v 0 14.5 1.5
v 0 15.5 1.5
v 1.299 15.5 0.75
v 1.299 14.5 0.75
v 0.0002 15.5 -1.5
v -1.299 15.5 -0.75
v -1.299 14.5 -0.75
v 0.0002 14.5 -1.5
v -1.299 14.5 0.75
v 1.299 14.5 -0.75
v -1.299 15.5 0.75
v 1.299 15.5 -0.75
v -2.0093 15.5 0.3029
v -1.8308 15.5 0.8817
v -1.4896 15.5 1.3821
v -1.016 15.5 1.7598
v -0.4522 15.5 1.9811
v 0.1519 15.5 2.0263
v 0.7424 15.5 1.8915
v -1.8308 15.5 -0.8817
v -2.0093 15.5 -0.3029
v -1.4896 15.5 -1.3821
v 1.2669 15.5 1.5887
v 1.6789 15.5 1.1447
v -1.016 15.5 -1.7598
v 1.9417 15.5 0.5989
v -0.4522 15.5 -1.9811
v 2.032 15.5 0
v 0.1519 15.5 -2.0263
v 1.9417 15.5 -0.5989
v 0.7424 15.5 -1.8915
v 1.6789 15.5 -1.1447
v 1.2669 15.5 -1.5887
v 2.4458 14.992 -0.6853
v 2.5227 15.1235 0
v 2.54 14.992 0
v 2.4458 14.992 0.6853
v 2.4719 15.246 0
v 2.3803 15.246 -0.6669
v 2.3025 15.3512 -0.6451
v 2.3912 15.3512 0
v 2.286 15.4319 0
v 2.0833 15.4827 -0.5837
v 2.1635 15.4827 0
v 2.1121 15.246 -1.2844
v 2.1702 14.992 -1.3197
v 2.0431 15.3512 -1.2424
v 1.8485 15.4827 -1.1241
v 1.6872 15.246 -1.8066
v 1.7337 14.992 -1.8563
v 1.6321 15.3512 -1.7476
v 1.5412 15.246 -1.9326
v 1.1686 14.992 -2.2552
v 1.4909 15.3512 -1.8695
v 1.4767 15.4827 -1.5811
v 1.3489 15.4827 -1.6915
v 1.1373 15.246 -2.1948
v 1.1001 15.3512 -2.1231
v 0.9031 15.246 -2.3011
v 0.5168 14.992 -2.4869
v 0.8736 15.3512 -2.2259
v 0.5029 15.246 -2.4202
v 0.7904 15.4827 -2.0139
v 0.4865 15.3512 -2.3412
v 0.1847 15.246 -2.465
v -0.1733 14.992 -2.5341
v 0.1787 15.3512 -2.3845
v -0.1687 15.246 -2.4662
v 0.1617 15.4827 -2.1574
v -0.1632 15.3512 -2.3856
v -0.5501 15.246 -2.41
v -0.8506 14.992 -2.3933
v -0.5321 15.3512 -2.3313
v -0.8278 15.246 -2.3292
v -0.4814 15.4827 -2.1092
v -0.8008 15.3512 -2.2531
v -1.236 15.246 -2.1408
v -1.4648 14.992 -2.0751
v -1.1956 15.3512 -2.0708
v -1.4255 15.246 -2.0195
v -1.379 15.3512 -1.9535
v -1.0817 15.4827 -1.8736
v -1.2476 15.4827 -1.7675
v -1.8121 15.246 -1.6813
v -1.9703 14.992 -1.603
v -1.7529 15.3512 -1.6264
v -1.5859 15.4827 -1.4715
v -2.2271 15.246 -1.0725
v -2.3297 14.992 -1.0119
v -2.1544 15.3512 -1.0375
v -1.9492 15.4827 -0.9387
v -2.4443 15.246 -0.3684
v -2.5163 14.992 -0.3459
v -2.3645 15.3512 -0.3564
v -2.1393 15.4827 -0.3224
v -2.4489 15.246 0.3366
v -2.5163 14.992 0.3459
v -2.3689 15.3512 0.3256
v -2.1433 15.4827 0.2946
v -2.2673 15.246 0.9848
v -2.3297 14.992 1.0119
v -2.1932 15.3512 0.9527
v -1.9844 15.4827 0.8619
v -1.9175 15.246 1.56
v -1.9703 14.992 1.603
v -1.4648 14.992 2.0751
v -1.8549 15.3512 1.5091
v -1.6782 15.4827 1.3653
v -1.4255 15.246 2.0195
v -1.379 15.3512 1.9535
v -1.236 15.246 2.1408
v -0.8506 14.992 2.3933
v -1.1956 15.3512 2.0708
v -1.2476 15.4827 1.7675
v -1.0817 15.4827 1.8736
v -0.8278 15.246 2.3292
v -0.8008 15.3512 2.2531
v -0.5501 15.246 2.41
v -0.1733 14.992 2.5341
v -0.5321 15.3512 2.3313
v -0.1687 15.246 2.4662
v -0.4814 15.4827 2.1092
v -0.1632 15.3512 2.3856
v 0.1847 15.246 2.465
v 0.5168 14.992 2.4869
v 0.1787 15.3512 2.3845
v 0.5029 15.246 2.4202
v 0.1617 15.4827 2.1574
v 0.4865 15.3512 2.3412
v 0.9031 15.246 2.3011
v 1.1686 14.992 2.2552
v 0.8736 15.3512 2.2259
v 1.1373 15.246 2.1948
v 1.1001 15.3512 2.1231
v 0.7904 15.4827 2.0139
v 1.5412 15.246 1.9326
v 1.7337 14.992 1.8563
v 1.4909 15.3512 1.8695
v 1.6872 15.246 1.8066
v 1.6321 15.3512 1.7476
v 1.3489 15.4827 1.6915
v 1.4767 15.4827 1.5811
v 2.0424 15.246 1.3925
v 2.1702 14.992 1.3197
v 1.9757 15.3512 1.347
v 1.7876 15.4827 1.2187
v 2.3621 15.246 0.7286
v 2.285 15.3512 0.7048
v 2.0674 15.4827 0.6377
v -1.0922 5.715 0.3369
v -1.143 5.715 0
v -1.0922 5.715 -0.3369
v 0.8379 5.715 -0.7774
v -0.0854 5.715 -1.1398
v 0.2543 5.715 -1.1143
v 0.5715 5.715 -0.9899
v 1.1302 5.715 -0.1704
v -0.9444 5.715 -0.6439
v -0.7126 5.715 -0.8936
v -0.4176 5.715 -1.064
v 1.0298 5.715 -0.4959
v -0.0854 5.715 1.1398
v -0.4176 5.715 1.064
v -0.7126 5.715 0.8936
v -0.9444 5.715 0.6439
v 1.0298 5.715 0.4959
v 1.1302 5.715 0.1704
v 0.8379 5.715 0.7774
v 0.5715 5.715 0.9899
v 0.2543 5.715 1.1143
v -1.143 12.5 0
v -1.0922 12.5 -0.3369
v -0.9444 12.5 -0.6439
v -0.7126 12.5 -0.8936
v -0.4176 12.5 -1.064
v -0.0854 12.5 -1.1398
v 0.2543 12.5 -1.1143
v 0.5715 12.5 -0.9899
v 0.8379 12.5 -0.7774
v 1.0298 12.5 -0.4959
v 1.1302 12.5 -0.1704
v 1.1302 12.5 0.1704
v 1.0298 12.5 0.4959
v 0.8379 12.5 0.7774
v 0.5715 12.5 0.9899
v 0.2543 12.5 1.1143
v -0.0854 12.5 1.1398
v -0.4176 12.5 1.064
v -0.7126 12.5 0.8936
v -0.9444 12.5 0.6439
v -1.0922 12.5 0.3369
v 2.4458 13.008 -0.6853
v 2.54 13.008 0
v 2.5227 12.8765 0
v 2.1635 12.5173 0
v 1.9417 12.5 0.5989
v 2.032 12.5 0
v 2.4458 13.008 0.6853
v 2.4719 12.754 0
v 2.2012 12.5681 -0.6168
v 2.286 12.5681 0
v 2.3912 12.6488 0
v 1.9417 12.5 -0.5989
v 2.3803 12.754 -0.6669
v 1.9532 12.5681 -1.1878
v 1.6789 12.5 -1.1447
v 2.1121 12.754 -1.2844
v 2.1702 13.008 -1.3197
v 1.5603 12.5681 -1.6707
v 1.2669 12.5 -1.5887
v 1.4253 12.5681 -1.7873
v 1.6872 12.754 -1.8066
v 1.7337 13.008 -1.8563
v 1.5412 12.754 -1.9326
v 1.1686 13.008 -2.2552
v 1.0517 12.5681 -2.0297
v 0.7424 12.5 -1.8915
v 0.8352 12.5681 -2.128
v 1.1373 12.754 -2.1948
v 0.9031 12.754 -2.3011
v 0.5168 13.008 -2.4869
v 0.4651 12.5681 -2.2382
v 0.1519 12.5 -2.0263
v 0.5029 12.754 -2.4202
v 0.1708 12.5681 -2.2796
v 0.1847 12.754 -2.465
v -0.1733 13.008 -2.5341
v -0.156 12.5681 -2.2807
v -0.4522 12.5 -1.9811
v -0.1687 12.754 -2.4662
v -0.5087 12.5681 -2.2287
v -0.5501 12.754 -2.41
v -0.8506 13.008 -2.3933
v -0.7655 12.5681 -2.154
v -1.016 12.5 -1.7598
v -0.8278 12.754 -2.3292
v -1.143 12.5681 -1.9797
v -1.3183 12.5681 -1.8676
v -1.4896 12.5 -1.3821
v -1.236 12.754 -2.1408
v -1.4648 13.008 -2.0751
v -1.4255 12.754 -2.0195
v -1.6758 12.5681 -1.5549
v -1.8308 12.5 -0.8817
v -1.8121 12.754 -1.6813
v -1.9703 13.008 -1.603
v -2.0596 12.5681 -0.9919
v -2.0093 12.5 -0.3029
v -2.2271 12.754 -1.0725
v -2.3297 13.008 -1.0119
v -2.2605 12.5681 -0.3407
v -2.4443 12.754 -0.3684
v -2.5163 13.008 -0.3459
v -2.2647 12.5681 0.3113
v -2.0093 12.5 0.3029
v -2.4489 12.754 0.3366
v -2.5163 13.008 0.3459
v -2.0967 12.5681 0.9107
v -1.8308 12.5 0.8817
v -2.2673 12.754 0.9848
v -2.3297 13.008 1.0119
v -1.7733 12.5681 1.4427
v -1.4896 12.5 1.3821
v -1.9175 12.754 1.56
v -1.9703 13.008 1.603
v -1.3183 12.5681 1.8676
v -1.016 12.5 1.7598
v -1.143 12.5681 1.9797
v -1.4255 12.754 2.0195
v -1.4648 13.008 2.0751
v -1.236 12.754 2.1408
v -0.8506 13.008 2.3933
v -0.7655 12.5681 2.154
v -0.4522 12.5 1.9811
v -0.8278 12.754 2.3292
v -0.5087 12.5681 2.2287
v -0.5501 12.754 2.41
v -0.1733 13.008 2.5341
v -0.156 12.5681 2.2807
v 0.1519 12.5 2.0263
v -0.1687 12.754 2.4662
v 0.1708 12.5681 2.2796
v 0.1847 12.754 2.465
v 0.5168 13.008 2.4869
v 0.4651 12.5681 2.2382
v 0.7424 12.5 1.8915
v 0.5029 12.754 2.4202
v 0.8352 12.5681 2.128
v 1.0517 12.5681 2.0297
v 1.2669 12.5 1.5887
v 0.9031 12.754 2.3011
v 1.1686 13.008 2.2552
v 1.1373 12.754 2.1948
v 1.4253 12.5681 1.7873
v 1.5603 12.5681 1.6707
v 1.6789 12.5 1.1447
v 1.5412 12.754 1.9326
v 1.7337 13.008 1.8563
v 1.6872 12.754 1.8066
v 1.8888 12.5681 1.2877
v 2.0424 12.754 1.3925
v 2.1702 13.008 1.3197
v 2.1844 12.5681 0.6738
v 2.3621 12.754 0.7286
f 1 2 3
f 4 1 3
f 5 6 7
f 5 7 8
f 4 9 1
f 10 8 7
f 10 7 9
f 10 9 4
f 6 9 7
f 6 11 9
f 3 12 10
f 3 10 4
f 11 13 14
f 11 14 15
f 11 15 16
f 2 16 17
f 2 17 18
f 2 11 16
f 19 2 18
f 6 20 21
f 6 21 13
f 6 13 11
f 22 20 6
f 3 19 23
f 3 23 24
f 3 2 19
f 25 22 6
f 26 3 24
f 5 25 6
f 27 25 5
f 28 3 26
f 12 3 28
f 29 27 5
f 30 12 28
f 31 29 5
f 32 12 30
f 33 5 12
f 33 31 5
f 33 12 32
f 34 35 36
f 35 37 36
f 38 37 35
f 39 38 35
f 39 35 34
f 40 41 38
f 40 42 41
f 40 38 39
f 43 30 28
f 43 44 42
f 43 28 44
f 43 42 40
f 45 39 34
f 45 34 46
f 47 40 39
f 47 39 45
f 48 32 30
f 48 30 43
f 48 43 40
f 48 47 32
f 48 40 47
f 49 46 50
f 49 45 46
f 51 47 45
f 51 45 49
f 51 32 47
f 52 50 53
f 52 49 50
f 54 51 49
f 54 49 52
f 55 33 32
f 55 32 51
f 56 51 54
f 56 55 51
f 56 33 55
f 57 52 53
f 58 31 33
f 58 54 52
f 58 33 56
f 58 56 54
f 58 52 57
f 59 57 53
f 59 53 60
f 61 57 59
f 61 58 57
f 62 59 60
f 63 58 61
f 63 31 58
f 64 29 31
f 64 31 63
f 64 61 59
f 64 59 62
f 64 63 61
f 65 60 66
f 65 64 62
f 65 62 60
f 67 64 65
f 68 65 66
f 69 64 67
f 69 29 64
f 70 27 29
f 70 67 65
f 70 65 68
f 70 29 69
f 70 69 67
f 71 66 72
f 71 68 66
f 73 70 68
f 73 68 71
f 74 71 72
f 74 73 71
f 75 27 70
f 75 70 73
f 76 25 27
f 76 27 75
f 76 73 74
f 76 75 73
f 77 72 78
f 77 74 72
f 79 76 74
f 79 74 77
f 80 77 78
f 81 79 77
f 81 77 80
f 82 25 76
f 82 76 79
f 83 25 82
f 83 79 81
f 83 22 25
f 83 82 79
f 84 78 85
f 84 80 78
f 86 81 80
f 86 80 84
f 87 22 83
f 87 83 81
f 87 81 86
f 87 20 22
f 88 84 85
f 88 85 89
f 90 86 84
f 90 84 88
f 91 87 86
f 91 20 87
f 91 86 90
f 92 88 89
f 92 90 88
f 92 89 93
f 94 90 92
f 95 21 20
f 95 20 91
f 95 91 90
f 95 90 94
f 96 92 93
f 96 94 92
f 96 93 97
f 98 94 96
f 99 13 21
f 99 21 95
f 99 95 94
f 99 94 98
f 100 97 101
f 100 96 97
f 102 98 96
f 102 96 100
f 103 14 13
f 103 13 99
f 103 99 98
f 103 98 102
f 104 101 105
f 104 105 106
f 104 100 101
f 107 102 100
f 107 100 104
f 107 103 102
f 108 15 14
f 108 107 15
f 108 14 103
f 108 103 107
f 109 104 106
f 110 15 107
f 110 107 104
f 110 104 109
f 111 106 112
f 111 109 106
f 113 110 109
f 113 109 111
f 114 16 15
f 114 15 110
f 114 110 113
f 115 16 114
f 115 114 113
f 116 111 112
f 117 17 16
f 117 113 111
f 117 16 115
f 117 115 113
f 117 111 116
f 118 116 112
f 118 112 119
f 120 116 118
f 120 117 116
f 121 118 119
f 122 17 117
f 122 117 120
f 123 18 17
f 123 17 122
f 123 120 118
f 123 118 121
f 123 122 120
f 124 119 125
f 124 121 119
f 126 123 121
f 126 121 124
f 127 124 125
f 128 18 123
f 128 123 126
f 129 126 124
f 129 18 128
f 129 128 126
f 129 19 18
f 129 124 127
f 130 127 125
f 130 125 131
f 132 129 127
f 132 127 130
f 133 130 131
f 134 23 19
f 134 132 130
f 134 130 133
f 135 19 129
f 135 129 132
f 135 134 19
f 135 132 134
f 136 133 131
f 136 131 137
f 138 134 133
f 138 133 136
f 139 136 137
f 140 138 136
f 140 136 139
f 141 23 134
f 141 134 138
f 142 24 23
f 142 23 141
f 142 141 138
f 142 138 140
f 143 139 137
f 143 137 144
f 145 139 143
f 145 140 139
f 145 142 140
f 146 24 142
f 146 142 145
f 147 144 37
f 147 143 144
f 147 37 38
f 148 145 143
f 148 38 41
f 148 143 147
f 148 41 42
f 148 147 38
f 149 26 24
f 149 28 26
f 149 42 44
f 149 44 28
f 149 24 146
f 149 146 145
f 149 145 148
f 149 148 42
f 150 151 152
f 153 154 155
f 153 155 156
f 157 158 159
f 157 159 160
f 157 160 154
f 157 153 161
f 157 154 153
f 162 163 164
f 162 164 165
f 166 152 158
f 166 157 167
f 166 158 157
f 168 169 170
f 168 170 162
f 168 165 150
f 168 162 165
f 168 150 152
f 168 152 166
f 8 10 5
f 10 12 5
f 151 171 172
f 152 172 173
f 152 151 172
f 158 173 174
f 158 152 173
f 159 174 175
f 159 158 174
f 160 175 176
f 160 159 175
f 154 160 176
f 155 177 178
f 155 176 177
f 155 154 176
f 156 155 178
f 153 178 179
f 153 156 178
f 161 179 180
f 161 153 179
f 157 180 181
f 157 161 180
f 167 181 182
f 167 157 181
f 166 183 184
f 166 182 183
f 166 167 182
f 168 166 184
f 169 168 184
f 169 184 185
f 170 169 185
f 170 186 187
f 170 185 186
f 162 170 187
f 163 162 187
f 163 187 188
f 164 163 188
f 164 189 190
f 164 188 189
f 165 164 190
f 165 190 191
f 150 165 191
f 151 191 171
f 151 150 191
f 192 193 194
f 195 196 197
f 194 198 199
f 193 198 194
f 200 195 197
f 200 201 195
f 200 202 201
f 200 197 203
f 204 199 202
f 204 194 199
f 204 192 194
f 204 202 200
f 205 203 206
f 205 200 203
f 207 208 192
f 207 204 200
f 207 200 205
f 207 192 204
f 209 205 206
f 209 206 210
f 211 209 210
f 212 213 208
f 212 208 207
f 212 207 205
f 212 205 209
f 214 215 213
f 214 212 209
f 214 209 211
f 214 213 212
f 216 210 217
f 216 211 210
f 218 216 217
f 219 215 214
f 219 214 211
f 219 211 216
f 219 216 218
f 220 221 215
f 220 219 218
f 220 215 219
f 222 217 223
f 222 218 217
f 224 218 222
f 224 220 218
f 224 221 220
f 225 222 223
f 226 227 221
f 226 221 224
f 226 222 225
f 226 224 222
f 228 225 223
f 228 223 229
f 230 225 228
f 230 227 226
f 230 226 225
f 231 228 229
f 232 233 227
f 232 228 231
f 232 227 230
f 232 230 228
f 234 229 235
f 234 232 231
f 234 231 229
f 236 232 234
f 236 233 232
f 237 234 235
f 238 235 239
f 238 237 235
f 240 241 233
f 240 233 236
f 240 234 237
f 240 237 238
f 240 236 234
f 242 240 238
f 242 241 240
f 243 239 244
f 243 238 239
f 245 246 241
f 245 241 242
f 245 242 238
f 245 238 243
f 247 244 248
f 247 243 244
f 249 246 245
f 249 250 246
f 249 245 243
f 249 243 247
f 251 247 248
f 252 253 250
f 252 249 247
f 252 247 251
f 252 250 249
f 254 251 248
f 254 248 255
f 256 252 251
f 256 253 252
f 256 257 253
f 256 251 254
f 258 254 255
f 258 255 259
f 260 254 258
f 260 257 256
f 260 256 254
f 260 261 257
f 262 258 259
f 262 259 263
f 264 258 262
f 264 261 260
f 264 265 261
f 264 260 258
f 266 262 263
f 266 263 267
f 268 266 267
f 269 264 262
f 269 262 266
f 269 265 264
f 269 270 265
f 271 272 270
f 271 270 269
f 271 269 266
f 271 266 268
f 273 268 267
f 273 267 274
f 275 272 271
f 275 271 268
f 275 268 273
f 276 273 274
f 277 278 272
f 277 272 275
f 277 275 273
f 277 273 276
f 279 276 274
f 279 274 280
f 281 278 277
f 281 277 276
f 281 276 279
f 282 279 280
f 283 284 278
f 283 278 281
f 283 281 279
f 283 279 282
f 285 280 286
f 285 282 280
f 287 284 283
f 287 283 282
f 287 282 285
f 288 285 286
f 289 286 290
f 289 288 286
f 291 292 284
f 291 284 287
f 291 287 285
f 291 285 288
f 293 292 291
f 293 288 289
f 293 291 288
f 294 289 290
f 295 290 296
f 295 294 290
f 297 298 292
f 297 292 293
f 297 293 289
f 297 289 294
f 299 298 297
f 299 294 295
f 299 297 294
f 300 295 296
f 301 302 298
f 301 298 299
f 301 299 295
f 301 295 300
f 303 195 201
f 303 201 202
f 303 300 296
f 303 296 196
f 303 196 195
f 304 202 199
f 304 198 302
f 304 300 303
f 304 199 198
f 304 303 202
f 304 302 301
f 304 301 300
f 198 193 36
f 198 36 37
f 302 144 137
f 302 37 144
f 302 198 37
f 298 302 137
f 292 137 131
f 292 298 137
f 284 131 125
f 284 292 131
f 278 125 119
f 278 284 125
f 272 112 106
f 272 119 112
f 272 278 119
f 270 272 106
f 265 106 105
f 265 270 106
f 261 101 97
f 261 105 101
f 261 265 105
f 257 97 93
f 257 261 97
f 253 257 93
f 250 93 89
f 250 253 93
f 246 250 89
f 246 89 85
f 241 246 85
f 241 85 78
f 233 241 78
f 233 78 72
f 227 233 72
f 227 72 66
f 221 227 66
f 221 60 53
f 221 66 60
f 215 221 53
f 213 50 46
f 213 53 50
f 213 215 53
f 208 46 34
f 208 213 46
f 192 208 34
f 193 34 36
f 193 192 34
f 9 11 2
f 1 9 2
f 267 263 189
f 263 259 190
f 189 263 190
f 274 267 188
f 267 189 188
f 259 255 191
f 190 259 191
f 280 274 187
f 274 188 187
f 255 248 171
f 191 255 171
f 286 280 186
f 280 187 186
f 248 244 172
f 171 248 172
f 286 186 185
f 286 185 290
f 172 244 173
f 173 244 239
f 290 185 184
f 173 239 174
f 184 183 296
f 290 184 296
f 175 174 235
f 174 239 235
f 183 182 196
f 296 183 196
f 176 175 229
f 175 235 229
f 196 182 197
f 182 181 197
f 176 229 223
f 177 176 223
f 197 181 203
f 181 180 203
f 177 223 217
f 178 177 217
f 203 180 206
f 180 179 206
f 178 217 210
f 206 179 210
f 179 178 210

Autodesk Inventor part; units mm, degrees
ref_plane "YZ Plane" through (0, 0, 0) normal (1, 0, 0) x (0, 1, 0)
ref_plane "XZ Plane" through (0, 0, 0) normal (0, 1, 0) x (-1, 0, 0)
ref_plane "XY Plane" through (0, 0, 0) normal (0, 0, 1) x (1, 0, 0)
sketch "Sketch1" plane through (0, 0, 0) normal (0, 1, 0) x (-1, 0, 0)
  circle A0 centre (0, 0) radius 1.143
  dimension "d24" = 2.286
extrude "Extrusion1" add sketch "Sketch1" along normal blind 12.5
sketch "Sketch2" plane through (0, 12.5, 0) normal (0, 1, 0) x (1, 0, 0)
  circle A0 centre (0, 0) radius 1.5 projected
  circle A1 centre (0, 0) radius 2.54
  dimension "d3" = 5.08
extrude "Extrusion2" add sketch "Sketch2" along normal blind 3 contours A0 | A1
fillet "Fillet1" radius 0.508 2 edges at (-2.54, 15.5, 0) (-2.54, 12.5, 0)
sketch "Sketch3" plane through (0, 15.5, 0) normal (0, 1, 0) x (1, 0, 0)
  line L0 (0, 0) -> (1.5, 0) construction
  line L1 (-1.299, -0.75) -> (-1.299, 0.75)
  line L2 (-1.299, 0.75) -> (0.0002, 1.5)
  line L3 (1.299, 0.75) -> (0.0002, 1.5)
  line L4 (1.299, 0.75) -> (1.299, -0.75)
  line L5 (0, -1.5) -> (1.299, -0.75)
  line L6 (-1.299, -0.75) -> (0, -1.5)
extrude "Extrusion4" cut sketch "Sketch3" against normal blind 1
sketch "Sketch4" plane through (0, 0, 0) normal (0, 0, 1) x (1, 0, 0)
  point P0 (0, 0)
sketch "Sketch5" plane through (0, 0, 0) normal (0, -1, 0) x (1, 0, 0)
  circle A0 centre (0, 0) radius 3.3551
extrude "Extrusion5" cut sketch "Sketch5" against normal blind 5.715
thread "Thread3" size "3-48 UNC" class "2A" standard "ANSI Unified Screw Threads" full length
properties part number "screw"
